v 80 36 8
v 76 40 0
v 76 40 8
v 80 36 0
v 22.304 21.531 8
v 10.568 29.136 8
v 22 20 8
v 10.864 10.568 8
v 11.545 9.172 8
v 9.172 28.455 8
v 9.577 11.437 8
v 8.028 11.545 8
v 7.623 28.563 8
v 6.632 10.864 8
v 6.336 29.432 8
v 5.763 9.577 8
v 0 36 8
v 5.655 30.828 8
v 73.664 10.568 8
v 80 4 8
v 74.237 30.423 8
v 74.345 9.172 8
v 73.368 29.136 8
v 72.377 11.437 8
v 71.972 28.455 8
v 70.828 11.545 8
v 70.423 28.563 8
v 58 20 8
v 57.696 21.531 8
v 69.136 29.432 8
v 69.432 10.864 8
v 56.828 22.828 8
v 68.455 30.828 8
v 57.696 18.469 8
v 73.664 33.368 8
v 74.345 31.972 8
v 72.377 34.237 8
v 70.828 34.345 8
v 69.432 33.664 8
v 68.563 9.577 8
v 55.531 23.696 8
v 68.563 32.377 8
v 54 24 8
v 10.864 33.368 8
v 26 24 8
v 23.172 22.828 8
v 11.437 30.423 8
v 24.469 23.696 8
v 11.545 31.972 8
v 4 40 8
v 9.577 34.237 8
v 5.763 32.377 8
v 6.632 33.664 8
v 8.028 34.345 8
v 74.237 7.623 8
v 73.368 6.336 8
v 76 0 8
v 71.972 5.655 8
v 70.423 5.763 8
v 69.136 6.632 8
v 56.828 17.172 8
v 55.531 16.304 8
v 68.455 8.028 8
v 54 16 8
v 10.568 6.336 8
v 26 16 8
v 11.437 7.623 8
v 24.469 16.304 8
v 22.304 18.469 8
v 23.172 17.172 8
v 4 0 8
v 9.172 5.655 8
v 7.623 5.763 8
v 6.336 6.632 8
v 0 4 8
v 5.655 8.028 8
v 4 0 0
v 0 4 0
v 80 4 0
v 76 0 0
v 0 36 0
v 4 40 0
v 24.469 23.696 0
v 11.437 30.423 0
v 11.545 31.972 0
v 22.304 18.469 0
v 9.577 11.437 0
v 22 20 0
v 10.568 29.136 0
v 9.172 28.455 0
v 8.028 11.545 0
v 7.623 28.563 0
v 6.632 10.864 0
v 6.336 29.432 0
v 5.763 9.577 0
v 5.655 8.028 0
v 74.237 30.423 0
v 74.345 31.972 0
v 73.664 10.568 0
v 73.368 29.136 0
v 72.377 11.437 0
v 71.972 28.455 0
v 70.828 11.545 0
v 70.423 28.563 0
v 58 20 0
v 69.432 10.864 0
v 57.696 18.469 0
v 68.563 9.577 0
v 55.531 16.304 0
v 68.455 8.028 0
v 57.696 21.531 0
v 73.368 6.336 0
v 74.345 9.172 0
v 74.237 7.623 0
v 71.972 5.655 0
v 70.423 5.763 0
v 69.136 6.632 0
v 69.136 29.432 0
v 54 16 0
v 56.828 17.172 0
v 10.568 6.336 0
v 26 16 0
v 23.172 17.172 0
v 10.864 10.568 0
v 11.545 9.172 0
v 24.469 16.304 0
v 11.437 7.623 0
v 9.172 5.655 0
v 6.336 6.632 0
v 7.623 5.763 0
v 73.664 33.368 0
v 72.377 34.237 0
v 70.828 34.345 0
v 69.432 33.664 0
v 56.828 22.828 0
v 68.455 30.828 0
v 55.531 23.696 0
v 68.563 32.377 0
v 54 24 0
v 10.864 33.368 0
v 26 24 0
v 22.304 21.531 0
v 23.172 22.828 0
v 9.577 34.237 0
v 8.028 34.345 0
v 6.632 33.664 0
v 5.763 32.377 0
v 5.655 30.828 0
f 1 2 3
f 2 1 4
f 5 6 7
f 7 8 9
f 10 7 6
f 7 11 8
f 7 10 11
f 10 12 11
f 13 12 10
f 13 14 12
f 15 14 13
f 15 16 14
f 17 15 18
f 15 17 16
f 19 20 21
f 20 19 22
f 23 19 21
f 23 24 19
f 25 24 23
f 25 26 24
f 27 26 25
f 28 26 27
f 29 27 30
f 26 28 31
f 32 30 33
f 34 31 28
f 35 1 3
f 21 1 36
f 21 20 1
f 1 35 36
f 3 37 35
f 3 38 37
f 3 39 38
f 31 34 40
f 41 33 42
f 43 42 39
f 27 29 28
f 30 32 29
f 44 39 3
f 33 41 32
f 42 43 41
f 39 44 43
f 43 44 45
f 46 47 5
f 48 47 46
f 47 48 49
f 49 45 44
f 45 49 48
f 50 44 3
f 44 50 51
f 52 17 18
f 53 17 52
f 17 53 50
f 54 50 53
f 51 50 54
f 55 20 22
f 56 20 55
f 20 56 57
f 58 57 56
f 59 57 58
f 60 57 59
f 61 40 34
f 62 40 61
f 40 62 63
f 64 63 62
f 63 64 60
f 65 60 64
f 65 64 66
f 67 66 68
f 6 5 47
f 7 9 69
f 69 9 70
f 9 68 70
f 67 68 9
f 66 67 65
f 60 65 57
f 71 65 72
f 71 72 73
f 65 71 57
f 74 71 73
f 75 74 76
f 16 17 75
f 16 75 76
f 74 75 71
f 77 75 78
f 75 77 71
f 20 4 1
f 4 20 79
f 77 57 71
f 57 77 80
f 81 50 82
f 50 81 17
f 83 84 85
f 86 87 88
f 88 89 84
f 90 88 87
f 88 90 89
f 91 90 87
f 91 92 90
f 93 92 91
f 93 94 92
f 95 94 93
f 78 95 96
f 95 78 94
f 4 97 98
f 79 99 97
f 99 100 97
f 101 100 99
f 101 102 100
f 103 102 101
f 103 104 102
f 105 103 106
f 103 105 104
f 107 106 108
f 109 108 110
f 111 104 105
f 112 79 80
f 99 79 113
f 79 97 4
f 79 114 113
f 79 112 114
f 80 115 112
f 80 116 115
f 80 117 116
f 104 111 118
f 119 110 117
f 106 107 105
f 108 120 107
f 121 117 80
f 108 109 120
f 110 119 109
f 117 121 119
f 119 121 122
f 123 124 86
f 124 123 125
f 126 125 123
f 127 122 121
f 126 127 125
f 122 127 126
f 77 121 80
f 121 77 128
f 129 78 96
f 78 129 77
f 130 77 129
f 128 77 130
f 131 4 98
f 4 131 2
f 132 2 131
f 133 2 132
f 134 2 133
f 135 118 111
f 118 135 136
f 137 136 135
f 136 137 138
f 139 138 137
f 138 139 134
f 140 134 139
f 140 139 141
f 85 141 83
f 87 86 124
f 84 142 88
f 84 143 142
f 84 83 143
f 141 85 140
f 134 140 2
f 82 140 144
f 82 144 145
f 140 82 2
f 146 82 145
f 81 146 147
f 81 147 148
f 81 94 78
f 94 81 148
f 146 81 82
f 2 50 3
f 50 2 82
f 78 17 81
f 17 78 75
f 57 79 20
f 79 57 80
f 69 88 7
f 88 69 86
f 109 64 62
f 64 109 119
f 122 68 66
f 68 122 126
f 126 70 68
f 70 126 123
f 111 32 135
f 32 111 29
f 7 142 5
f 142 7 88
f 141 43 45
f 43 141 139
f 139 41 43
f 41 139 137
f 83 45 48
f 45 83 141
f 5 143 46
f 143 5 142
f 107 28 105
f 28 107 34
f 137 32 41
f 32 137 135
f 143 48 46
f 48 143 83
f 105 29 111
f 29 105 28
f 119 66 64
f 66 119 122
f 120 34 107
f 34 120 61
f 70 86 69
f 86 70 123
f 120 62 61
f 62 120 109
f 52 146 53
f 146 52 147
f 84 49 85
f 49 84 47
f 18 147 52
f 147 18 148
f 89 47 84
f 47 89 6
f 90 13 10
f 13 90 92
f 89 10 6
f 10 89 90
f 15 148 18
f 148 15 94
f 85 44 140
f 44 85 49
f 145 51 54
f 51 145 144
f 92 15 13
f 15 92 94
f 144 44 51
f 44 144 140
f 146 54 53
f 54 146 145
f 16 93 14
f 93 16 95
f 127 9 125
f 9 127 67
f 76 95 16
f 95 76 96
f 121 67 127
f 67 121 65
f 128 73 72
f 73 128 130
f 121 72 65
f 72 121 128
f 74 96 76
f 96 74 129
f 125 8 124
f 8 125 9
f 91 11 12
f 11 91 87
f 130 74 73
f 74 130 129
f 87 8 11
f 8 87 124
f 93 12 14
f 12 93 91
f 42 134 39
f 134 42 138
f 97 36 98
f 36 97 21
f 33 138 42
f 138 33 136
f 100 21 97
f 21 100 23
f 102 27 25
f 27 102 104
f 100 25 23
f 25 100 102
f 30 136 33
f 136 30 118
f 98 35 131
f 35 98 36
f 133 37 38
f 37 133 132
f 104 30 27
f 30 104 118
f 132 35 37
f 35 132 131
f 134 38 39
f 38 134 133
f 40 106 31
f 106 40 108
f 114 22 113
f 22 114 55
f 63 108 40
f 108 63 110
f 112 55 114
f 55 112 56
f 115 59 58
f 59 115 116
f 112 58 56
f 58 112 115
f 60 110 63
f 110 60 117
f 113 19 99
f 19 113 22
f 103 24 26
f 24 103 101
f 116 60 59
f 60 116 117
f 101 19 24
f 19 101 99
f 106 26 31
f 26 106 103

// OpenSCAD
$fn = 32;

// ----------------------------------------------------------------------
// Bracket plate: slot plate 80 x 40
// ----------------------------------------------------------------------

// --- parameters (mm) ---
hole_r = 3;               // bolt hole radius
plate_t = 8;              // plate thickness, Z (extrusion height)
plate_l = 80;             // plate length
plate_w = 40;             // plate width
slot_l = 28;              // slot straight length
slot_r = 4;               // slot end radius

slot_len = slot_l + 2 * slot_r;
slot_w = 2 * slot_r;
hole_d2 = 2 * hole_r;

profile = [[4, 0], [76, 0], [80, 4], [80, 36], [76, 40], [4, 40], [0, 36], [0, 4]];  // primary outline, 8 points, counter clockwise
void_1 = [[54, 16], [55.531, 16.304], [56.828, 17.172], [57.696, 18.469], [58, 20], [57.696, 21.531], [56.828, 22.828], [55.531, 23.696], [54, 24], [26, 24], [24.469, 23.696], [23.172, 22.828], [22.304, 21.531], [22, 20], [22.304, 18.469], [23.172, 17.172], [24.469, 16.304], [26, 16]];  // grip slot, 18 points
void_2 = [[11.545, 31.972], [10.864, 33.368], [9.577, 34.237], [8.028, 34.345], [6.632, 33.664], [5.763, 32.377], [5.655, 30.828], [6.336, 29.432], [7.623, 28.563], [9.172, 28.455], [10.568, 29.136], [11.437, 30.423]];  // corner hole, 12 points
void_3 = [[11.545, 9.172], [10.864, 10.568], [9.577, 11.437], [8.028, 11.545], [6.632, 10.864], [5.763, 9.577], [5.655, 8.028], [6.336, 6.632], [7.623, 5.763], [9.172, 5.655], [10.568, 6.336], [11.437, 7.623]];  // corner hole, 12 points
void_4 = [[74.345, 31.972], [73.664, 33.368], [72.377, 34.237], [70.828, 34.345], [69.432, 33.664], [68.563, 32.377], [68.455, 30.828], [69.136, 29.432], [70.423, 28.563], [71.972, 28.455], [73.368, 29.136], [74.237, 30.423]];  // corner hole, 12 points
void_5 = [[74.345, 9.172], [73.664, 10.568], [72.377, 11.437], [70.828, 11.545], [69.432, 10.864], [68.563, 9.577], [68.455, 8.028], [69.136, 6.632], [70.423, 5.763], [71.972, 5.655], [73.368, 6.336], [74.237, 7.623]];  // corner hole, 12 points

// --- the one profile operation ---
difference() {
  linear_extrude(height = plate_t) polygon(points = profile);
  translate([0, 0, -1])
    linear_extrude(height = plate_t + 2) polygon(points = void_1);
  translate([0, 0, -1])
    linear_extrude(height = plate_t + 2) polygon(points = void_2);
  translate([0, 0, -1])
    linear_extrude(height = plate_t + 2) polygon(points = void_3);
  translate([0, 0, -1])
    linear_extrude(height = plate_t + 2) polygon(points = void_4);
  translate([0, 0, -1])
    linear_extrude(height = plate_t + 2) polygon(points = void_5);
}
